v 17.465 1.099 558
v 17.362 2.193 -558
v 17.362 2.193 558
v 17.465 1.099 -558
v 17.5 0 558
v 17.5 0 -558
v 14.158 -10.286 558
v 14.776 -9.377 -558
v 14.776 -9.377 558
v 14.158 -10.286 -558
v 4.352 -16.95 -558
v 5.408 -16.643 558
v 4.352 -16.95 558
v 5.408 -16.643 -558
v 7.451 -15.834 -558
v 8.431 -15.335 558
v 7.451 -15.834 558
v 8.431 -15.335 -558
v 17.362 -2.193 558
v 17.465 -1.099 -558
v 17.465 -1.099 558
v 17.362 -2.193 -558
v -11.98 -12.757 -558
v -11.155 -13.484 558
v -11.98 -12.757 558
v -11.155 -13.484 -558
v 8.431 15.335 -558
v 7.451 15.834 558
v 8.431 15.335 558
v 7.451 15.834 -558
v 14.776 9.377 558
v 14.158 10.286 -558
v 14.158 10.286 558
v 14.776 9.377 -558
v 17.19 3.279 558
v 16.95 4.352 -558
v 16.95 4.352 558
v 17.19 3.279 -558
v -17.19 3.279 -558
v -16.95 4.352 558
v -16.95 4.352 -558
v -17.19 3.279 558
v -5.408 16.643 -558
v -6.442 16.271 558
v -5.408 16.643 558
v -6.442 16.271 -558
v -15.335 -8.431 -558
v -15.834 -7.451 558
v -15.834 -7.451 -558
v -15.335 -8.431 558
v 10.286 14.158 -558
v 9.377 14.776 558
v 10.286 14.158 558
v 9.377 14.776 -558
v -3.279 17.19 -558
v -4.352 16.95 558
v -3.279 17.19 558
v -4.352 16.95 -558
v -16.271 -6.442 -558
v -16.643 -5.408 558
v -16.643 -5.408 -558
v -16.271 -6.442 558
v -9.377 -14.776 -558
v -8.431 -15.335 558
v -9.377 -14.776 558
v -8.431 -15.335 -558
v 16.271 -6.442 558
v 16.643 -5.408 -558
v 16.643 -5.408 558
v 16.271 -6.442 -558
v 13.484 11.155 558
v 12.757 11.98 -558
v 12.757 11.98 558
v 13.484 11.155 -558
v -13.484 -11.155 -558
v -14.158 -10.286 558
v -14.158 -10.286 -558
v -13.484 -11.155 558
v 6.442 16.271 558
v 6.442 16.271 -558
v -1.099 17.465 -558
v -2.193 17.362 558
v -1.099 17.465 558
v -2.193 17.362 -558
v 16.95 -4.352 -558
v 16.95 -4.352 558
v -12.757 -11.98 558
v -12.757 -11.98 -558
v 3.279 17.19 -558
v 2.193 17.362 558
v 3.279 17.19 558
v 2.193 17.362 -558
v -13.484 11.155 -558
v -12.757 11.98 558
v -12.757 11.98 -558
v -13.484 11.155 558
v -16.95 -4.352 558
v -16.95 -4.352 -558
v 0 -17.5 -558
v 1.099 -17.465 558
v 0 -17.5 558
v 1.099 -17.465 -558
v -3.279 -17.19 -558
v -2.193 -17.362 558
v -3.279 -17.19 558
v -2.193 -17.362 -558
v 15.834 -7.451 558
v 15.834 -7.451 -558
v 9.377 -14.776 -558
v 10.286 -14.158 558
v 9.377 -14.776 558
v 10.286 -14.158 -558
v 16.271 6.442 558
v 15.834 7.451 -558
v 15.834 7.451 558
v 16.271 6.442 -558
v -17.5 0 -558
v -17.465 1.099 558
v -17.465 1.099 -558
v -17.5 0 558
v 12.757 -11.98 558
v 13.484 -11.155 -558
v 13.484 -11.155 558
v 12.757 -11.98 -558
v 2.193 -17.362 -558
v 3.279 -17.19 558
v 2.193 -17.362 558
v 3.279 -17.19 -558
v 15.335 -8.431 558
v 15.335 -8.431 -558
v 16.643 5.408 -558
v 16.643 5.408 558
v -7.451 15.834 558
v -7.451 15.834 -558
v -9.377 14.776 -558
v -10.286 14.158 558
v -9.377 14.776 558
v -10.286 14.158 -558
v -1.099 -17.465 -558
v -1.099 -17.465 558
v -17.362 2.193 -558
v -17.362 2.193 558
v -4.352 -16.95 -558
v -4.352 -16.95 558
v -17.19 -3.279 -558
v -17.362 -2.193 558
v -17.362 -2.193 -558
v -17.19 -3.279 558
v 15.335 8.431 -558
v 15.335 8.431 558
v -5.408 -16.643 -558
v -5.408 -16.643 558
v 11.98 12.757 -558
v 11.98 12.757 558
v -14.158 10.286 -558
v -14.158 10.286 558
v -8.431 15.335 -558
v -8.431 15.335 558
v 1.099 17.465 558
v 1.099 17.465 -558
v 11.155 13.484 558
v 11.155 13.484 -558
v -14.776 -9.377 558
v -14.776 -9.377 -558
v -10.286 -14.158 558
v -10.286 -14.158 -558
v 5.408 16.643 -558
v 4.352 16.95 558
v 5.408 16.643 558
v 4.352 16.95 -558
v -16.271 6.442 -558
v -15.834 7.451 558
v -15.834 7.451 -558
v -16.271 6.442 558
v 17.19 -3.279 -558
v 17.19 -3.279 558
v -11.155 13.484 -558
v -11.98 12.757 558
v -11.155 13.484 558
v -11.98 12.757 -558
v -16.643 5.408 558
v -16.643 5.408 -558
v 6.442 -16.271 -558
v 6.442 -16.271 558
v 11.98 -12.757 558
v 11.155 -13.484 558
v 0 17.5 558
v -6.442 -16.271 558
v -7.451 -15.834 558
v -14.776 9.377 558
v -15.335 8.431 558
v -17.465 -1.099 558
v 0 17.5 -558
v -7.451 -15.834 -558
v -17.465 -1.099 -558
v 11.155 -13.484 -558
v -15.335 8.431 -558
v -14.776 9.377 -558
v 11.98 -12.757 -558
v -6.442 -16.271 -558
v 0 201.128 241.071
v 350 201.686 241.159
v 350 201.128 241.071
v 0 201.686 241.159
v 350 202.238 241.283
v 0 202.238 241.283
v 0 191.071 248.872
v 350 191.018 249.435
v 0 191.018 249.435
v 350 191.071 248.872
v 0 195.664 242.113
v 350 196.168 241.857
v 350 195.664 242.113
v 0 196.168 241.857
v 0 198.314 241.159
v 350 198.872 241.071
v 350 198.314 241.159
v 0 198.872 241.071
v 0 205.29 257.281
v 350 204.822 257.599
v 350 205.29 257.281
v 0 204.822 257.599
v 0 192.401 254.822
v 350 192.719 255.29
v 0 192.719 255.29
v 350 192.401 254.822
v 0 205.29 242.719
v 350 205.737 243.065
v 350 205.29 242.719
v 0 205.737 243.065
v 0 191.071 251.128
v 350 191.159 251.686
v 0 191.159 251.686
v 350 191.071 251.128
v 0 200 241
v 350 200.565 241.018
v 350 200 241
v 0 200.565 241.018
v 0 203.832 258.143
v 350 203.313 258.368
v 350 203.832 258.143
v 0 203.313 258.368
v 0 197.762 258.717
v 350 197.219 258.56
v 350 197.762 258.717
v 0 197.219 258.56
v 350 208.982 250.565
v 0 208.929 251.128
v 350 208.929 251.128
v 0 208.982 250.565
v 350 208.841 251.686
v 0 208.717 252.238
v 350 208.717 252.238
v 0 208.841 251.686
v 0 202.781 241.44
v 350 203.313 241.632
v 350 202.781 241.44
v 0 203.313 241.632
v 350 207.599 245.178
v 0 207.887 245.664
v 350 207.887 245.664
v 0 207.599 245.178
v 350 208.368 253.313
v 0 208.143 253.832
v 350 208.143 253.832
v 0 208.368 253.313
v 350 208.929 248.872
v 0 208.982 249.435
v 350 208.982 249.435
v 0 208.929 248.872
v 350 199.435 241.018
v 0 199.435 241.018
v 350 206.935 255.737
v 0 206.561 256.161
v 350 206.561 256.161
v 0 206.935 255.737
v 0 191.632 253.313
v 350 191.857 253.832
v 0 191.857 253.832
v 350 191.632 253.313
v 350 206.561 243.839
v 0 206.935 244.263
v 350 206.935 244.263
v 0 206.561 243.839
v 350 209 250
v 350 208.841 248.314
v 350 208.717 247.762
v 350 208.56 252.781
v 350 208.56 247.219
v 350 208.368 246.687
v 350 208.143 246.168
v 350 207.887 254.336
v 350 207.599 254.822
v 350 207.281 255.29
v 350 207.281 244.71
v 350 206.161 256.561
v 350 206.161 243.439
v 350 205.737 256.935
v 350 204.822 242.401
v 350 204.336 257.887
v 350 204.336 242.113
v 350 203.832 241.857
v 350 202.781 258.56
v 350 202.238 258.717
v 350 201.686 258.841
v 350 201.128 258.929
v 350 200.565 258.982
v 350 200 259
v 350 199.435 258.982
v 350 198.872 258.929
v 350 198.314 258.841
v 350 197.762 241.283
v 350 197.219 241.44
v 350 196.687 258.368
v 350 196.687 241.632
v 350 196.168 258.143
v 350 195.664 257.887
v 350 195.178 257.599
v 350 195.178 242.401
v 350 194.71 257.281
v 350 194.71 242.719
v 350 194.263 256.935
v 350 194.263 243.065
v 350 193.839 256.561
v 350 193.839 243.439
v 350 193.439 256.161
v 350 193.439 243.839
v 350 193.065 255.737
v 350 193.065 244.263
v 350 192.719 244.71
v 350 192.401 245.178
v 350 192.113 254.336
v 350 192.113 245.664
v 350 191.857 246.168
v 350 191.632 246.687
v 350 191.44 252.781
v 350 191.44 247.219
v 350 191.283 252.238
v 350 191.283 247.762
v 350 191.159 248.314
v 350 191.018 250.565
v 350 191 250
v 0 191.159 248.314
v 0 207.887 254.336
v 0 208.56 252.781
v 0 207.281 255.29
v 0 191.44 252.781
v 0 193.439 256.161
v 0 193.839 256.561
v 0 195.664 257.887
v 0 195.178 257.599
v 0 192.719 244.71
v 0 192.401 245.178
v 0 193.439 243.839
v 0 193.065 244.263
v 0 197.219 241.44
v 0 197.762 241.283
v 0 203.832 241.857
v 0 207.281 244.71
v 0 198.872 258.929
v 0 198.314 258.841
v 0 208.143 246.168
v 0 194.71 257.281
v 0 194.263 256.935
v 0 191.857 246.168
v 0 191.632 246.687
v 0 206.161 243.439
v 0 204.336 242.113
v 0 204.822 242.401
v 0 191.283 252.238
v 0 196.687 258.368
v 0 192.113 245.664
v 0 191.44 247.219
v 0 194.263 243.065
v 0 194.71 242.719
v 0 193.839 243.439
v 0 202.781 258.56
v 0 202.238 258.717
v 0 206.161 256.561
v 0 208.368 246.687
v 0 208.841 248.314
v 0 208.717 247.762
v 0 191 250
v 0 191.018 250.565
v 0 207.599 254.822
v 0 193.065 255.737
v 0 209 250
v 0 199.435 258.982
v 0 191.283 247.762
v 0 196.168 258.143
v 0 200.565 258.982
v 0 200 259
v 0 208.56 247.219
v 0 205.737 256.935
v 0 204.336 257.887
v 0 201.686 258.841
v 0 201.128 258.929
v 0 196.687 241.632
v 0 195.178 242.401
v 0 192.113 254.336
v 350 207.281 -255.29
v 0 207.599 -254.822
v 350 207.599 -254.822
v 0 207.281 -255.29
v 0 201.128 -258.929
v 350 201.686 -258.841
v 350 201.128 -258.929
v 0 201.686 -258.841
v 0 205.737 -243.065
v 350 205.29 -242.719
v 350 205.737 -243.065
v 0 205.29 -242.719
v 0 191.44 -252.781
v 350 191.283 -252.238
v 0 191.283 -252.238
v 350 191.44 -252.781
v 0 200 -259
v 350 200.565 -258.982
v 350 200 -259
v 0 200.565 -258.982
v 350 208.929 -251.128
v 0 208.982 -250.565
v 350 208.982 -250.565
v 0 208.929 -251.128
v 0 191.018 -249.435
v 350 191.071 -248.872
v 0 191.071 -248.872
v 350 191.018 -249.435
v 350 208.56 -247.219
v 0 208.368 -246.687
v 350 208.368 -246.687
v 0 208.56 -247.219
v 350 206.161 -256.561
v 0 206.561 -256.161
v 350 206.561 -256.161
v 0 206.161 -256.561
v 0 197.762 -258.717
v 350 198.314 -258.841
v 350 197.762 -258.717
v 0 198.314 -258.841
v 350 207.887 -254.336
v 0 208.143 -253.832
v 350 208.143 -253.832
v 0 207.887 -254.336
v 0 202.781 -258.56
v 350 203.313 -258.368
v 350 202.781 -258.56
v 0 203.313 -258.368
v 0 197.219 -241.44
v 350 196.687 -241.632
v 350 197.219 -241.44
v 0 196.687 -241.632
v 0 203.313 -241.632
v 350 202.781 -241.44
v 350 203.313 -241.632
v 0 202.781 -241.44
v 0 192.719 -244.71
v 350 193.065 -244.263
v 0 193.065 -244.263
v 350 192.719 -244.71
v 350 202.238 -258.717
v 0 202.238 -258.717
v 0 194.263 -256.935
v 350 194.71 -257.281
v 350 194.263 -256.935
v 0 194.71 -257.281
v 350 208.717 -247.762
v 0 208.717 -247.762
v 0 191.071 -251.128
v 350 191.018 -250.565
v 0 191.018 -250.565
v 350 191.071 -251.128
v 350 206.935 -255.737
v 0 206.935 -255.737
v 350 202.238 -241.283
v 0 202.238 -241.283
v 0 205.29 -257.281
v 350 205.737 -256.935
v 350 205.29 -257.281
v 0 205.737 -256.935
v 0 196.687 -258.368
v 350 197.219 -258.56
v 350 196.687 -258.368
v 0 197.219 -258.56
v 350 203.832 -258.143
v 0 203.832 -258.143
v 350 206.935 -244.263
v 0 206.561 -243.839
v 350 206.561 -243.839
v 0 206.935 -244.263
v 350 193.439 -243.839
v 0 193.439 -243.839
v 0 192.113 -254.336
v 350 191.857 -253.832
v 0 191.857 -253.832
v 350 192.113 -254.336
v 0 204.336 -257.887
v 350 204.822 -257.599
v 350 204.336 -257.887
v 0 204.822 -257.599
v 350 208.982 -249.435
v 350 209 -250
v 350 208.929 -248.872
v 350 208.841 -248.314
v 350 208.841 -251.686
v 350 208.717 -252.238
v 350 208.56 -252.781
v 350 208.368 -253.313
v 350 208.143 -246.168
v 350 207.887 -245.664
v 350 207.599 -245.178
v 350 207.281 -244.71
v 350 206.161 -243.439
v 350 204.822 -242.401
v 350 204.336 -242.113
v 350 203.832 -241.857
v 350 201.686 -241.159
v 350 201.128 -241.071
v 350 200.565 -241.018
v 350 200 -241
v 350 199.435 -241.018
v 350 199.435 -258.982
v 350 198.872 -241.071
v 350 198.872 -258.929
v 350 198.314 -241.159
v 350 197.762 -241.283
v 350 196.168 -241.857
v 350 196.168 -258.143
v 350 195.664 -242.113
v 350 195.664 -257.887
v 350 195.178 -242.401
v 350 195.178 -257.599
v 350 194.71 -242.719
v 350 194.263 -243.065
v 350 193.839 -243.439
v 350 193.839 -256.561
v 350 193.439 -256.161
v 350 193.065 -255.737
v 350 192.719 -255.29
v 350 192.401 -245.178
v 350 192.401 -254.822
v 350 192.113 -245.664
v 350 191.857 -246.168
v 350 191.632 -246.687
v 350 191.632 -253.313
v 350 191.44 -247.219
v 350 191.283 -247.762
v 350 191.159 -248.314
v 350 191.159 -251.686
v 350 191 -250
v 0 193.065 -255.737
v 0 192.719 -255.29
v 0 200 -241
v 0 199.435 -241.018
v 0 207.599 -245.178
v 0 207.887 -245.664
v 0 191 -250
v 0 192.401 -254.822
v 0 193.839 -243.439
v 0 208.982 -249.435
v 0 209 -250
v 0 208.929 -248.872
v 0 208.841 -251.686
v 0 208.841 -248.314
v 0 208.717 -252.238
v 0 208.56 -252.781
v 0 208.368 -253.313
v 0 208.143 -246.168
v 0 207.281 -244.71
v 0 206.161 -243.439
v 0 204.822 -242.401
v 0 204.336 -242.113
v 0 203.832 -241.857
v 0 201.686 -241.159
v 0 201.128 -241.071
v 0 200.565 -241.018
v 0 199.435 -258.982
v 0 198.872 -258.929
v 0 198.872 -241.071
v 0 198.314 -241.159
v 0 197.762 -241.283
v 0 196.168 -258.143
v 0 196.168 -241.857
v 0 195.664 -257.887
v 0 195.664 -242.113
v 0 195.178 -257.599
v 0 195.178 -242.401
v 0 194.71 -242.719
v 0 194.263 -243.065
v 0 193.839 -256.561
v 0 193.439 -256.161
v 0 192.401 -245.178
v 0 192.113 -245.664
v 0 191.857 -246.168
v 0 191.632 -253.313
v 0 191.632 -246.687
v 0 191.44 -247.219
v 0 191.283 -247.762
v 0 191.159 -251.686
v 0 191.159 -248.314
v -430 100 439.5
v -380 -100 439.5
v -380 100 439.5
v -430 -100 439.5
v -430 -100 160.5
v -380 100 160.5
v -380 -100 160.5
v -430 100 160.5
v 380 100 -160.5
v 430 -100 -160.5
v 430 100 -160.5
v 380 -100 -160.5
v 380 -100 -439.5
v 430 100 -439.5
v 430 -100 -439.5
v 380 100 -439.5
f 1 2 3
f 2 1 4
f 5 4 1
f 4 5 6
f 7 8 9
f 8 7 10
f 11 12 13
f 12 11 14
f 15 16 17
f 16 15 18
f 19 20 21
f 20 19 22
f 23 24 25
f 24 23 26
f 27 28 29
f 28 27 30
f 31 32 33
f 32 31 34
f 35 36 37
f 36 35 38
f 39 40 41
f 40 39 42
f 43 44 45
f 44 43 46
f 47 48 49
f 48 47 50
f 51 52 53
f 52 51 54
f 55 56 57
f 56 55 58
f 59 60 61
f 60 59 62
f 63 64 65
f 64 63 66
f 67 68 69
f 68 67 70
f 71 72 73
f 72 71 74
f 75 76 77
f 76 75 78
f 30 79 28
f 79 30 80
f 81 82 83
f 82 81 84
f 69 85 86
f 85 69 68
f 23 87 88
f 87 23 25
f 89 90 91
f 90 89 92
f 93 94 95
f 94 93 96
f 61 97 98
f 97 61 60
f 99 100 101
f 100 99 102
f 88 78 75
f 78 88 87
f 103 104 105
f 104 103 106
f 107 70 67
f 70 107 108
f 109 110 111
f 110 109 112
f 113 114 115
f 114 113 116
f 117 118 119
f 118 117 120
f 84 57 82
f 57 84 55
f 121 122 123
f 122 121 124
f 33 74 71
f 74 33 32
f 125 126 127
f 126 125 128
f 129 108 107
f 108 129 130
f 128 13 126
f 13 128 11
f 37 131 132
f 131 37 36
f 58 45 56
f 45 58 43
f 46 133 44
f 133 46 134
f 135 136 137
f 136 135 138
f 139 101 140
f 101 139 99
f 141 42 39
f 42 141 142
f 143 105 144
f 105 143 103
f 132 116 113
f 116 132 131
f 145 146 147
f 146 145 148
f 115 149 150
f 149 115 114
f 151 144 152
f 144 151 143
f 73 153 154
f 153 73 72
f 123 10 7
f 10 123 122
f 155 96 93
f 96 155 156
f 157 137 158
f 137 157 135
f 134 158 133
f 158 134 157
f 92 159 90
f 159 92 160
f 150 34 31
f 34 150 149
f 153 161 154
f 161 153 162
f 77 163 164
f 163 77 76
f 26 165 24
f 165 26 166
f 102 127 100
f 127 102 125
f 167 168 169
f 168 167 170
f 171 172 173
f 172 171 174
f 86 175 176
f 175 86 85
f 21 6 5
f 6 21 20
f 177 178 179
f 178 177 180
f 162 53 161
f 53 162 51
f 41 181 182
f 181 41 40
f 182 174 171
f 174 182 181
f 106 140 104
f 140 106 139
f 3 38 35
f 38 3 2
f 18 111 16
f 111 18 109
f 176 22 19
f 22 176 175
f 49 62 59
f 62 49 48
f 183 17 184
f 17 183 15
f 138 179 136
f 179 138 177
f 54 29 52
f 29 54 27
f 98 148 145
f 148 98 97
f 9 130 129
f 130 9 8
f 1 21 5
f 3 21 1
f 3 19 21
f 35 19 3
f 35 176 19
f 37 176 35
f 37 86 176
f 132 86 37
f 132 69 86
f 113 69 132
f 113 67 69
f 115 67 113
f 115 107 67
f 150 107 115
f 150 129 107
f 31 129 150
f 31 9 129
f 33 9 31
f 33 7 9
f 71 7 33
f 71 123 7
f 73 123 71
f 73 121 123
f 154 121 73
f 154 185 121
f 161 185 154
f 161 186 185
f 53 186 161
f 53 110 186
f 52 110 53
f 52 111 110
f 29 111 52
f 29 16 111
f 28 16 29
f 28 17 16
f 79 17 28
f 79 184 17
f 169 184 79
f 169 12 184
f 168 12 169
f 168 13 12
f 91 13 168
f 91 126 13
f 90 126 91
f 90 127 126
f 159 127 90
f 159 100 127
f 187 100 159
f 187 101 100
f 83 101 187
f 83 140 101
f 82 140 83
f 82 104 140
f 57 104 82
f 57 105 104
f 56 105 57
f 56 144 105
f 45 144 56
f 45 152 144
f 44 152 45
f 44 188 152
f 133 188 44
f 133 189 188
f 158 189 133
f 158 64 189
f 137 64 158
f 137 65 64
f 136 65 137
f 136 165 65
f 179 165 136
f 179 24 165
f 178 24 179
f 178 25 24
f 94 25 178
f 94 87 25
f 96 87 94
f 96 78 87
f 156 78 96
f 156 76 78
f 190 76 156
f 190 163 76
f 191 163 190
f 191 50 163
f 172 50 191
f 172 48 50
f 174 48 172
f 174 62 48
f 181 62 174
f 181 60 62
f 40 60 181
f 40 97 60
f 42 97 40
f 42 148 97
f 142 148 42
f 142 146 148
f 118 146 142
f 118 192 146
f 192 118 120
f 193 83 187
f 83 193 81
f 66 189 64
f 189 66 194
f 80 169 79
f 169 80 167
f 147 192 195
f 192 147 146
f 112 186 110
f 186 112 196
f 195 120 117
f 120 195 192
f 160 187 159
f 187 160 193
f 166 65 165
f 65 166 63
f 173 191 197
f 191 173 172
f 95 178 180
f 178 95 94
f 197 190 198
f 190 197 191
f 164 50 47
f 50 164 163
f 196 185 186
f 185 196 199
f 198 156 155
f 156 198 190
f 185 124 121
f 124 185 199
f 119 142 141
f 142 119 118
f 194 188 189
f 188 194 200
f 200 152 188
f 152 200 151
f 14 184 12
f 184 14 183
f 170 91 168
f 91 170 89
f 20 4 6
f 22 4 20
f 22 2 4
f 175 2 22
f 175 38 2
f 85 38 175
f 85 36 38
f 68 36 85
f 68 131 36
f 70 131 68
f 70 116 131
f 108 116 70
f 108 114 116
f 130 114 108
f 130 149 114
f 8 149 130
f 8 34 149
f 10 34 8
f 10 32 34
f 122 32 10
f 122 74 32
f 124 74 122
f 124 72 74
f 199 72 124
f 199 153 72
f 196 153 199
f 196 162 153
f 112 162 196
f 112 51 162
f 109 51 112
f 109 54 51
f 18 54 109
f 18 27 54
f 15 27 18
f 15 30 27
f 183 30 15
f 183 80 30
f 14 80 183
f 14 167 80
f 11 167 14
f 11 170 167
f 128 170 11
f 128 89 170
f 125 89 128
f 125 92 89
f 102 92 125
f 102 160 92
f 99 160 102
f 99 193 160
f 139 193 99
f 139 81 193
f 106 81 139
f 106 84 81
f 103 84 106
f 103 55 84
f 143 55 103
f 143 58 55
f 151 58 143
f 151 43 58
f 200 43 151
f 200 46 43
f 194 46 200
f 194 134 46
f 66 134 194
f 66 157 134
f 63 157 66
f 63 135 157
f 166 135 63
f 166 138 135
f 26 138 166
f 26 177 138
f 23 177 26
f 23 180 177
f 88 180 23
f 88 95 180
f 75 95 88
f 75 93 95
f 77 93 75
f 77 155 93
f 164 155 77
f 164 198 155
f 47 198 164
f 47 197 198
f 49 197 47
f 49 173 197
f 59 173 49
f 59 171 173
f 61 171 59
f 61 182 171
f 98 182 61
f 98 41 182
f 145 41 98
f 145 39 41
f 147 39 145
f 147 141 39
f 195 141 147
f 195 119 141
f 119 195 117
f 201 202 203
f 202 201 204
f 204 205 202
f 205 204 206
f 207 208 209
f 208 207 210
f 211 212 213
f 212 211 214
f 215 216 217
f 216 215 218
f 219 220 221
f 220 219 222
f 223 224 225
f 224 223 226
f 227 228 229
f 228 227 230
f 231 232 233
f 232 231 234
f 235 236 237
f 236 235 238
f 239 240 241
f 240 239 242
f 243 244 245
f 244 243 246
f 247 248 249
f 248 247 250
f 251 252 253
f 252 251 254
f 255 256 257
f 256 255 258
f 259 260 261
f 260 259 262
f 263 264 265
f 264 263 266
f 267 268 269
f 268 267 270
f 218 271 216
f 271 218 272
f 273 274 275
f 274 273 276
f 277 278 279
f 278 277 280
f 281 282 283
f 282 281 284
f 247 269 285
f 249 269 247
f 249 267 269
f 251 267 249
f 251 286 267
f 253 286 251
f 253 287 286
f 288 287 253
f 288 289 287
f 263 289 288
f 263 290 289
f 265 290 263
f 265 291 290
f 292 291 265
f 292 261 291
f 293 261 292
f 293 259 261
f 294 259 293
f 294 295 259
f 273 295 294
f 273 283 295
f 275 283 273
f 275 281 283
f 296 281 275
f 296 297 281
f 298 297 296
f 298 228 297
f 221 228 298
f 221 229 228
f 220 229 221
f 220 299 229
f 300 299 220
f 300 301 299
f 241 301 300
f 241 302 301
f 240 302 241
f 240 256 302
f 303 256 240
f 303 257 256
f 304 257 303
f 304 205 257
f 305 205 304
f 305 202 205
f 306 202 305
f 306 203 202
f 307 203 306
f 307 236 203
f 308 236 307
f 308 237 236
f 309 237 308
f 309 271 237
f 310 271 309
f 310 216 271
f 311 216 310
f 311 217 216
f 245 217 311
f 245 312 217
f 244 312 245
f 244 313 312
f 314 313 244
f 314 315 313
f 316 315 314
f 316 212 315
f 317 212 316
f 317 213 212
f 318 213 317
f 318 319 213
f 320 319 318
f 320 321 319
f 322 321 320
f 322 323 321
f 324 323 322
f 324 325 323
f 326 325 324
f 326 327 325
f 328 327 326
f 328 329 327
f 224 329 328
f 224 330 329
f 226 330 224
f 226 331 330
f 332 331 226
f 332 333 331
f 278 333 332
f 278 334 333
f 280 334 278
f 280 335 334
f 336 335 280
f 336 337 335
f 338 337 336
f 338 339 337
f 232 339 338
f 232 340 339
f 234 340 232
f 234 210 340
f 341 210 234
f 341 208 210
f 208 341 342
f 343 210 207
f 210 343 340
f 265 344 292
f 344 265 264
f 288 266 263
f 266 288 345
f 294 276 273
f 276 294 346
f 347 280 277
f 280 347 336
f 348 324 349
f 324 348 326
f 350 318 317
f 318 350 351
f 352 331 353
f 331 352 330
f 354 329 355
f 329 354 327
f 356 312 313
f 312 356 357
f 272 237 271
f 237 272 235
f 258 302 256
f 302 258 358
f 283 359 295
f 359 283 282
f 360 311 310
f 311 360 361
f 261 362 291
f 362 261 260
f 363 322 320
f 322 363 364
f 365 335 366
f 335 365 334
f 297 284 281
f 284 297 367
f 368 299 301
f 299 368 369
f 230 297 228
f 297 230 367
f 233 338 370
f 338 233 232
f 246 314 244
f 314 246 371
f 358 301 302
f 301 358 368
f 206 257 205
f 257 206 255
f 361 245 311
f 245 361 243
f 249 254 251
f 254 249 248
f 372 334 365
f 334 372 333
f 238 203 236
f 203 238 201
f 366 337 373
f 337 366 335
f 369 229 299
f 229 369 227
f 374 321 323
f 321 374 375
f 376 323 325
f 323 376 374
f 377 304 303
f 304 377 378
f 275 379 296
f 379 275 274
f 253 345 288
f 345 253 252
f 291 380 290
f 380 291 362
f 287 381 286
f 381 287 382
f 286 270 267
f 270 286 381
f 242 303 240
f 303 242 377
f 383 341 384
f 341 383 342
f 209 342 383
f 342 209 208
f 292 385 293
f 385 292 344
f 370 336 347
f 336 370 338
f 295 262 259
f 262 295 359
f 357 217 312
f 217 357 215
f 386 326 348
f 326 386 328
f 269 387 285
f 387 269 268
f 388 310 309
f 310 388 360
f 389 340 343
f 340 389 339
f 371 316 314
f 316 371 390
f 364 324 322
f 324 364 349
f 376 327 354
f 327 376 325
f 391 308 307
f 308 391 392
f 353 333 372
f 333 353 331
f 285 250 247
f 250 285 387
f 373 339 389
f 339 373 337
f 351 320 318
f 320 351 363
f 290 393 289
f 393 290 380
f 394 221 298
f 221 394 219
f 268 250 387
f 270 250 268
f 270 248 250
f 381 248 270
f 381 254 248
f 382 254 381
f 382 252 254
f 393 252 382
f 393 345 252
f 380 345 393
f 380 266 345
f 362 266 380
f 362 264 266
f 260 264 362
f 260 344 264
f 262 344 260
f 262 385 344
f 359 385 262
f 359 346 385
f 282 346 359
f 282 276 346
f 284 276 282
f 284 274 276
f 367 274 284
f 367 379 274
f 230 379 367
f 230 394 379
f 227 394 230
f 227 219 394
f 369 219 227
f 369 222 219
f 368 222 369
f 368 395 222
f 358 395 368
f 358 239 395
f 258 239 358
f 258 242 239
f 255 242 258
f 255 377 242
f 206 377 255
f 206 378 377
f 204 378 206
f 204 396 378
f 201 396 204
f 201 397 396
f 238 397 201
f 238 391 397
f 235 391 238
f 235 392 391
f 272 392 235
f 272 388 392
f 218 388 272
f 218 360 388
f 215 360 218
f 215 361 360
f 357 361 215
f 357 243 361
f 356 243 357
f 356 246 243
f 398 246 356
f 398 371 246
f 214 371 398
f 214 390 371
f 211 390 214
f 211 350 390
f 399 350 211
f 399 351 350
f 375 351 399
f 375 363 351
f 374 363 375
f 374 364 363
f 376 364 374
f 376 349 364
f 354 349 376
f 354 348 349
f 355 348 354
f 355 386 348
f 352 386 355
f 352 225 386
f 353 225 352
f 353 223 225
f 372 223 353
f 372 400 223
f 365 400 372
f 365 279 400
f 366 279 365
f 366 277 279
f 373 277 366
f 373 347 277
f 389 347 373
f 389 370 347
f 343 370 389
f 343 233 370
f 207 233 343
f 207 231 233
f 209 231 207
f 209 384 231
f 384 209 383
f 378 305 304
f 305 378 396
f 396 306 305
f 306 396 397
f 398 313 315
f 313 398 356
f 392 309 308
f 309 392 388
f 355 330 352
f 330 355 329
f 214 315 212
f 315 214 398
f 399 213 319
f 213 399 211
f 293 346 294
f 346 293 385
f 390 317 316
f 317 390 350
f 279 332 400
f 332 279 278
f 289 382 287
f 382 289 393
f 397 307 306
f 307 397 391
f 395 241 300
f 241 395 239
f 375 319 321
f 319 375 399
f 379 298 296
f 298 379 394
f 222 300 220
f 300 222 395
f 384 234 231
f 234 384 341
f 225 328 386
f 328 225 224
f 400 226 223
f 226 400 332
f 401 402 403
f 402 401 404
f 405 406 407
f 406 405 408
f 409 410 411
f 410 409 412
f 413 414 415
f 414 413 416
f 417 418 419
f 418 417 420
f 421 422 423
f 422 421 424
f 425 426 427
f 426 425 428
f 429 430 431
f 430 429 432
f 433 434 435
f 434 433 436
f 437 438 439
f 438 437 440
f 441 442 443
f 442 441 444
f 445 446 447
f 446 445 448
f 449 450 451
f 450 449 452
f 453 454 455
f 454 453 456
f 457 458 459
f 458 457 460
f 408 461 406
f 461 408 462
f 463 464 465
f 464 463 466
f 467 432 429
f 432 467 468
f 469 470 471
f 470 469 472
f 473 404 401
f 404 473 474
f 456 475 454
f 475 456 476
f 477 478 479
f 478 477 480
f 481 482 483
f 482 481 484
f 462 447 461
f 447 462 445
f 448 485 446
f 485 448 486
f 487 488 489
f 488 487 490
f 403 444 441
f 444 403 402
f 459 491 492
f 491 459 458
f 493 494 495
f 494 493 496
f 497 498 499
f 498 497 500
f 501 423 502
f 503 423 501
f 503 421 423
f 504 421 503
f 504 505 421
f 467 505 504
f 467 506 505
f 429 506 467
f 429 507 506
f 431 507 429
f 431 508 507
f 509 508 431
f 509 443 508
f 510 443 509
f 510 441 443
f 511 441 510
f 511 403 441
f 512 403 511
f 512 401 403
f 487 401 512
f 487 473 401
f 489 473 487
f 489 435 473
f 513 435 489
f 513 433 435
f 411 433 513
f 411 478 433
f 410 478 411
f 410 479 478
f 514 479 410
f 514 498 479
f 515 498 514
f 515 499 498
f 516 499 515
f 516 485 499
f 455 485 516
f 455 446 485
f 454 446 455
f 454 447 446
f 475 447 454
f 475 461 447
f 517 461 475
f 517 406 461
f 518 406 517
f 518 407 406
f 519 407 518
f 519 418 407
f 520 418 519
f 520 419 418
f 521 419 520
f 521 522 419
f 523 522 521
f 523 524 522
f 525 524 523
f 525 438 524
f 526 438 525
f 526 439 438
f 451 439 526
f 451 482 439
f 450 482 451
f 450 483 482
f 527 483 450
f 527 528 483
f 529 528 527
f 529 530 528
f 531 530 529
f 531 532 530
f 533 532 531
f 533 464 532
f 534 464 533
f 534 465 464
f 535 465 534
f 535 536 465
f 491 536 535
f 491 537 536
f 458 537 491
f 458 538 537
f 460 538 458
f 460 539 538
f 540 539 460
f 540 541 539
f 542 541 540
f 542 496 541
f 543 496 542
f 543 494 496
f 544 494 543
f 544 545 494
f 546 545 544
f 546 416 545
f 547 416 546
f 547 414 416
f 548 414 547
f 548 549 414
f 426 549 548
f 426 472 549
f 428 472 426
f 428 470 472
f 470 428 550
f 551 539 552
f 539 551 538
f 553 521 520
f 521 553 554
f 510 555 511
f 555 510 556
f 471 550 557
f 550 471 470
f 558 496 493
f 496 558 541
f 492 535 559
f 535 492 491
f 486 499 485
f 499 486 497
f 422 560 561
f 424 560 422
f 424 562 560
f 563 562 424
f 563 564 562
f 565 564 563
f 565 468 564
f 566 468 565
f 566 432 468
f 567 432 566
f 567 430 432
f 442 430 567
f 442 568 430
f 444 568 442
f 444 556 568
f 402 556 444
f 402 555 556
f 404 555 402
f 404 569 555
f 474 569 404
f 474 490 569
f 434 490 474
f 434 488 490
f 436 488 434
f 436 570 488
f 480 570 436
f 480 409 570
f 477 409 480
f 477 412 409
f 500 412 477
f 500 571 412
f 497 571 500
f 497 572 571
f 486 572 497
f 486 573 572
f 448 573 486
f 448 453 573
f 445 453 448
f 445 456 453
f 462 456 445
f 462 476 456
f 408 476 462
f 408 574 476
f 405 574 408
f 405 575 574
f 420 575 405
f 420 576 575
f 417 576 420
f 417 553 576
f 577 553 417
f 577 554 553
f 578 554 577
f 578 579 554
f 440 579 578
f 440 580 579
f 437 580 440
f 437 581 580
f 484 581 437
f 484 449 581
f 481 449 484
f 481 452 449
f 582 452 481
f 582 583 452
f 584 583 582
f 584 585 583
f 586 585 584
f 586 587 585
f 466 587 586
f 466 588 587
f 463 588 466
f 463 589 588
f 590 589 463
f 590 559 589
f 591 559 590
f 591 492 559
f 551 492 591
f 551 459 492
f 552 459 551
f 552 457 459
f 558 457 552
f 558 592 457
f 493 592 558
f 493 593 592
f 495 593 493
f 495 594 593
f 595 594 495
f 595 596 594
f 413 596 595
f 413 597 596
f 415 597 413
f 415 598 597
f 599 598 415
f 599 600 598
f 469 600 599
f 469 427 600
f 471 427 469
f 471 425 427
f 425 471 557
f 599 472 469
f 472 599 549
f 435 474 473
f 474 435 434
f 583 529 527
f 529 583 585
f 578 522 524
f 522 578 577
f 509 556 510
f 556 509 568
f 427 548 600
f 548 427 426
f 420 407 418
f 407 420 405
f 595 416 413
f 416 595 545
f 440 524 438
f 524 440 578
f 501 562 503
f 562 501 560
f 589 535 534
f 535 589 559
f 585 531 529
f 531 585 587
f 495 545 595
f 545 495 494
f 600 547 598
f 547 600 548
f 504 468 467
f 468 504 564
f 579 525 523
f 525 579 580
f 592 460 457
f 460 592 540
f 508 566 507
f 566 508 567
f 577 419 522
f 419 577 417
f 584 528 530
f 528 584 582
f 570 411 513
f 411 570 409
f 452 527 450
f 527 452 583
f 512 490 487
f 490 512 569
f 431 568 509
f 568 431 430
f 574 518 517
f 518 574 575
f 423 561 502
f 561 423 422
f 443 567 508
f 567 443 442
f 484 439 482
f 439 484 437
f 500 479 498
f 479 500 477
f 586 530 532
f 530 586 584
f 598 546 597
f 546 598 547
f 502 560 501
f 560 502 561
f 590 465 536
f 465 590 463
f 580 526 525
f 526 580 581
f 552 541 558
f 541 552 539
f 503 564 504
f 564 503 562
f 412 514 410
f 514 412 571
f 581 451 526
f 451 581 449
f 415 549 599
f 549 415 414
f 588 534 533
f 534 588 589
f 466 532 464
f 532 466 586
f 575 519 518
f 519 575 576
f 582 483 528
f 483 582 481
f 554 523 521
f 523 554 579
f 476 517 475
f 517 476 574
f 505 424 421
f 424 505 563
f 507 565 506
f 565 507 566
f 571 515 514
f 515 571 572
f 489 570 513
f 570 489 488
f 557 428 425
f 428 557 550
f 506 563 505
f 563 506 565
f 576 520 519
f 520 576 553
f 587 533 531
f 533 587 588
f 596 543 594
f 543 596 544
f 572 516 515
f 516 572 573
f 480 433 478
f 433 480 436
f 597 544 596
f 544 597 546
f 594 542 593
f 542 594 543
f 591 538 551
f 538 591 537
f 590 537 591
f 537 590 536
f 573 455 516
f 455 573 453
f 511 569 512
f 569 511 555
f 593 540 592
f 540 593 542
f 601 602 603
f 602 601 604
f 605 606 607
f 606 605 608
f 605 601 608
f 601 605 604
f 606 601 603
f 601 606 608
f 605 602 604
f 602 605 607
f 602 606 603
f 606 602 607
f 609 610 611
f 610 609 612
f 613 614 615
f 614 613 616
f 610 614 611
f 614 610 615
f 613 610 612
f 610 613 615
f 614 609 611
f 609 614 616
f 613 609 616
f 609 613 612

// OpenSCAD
// ============================================================================
// PROJECT: XXXG-00W0 WING GUNDAM ZERO EW - WEAPON RECOUPLING INFRA
// COMPONENT VAULT: BANDAI CAST RUNNER D - RECEIVER LATCHES D19 & D20
// PACKAGING RE-ARCHITECTURE: SUB-ARMOR CAPACITOR RECESSED BANK INTEGRATION
// CONFIG METRIC: SCALED TITANIUM CASTS (1:1 ACTUAL METRIC UP-SCALE)
// ============================================================================

$fn = 100; // Circular segment rendering resolution count

// Structural Constants Scaled 1:1 for a 16.7-Meter Airframe Scale (mm)
latch_total_length = 620;                // Total longitudinal vertical height (mm)
latch_outer_diameter = 260;              // Transverse weapon track bounding width (mm)
armor_skin_thickness = 50;              // Solid TiAl protective plating wall (mm)
harness_conduit_width = 40;             // Cast-in 4oz copper logic trace track (mm)
capacitor_pocket_depth = 15;            // Sub-armor recessed housing pocket depth (mm)
capacitor_pocket_width = 110;           // Transverse MLCC array pocket width (mm)

module Runner_D_Receiver_Latch_Forge() {
    // Central Supply Injection Runner Axis (Molten Feed Line from Siphon Forge)
    color([0.25, 0.25, 0.28]) {
        cylinder(h = latch_total_length * 1.8, d = 35, center = true);
        // Direct injection gates tracking straight into the part mold cavities
        translate([0, 200, 250]) rotate([0, 90, 0]) cylinder(h = 350, d = 18);
        translate([0, 200, -250]) rotate([0, 90, 0]) cylinder(h = 350, d = 18);
    }
    
    // Instantiate Scaled Skeutomorphic Part Molds Symmetrically (Left & Right)
    Cast_Internal_Receiver_Latches();
}

module Cast_Internal_Receiver_Latches() {
    // ---- PART D19: INTERNAL LEFT WEAPON RECEIVER LATCH ---- [Page 23, Step 14-3]
    translate([-300, 0, 300]) color([0.5, 0.5, 0.55]) { // Weapon Metallic Casing Spec
        difference() {
            // Main solid heavy-duty receiver latch block segment
            cube([latch_outer_diameter, 200, latch_total_length * 0.45], center = true);
            
            // Central interface slot cut out (Clears the main power coupling rail)
            cube([latch_outer_diameter - (armor_skin_thickness * 2), 220, latch_total_length * 0.5], center = true);
            
            // SUB-ARMOR RECESSED CAPACITOR POCKETS [Segmented rows cut inside the yokes]
            for (z_offset = [-100, 0, 100]) {
                translate([(latch_outer_diameter/2 - armor_skin_thickness + capacitor_pocket_depth/2), 0, z_offset])
                    cube([capacitor_pocket_depth, capacitor_pocket_width, 80], center = true);
            }
            
            // Continuous cast-in routing track for the 4oz solid-state wiring rails
            cube([harness_conduit_width, 220, latch_total_length], center = true);
            
            // Slicing profile tool to generate an asymmetrical half-shell part component
            translate([latch_outer_diameter, 0, 0])
                cube([latch_outer_diameter * 2, 400, latch_total_length], center = true);
        }
    }
    
    // ---- PART D20: INTERNAL RIGHT WEAPON RECEIVER LATCH ---- [Page 23, Step 14-3]
    translate([300, 0, -300]) rotate([0, 0, 180]) color([0.5, 0.5, 0.55]) {
        difference() {
            cube([latch_outer_diameter, 200, latch_total_length * 0.45], center = true);
            cube([latch_outer_diameter - (armor_skin_thickness * 2), 220, latch_total_length * 0.5], center = true);
            
            for (z_offset = [-100, 0, 100]) {
                translate([(latch_outer_diameter/2 - armor_skin_thickness + capacitor_pocket_depth/2), 0, z_offset])
                    cube([capacitor_pocket_depth, capacitor_pocket_width, 80], center = true);
            }
            
            cube([harness_conduit_width, 220, latch_total_length], center = true);
            translate([latch_outer_diameter, 0, 0])
                cube([latch_outer_diameter * 2, 400, latch_total_length], center = true);
        }
    }
}

// Render Master Assembly to Parameter Workspace
Runner_D_Receiver_Latch_Forge();
